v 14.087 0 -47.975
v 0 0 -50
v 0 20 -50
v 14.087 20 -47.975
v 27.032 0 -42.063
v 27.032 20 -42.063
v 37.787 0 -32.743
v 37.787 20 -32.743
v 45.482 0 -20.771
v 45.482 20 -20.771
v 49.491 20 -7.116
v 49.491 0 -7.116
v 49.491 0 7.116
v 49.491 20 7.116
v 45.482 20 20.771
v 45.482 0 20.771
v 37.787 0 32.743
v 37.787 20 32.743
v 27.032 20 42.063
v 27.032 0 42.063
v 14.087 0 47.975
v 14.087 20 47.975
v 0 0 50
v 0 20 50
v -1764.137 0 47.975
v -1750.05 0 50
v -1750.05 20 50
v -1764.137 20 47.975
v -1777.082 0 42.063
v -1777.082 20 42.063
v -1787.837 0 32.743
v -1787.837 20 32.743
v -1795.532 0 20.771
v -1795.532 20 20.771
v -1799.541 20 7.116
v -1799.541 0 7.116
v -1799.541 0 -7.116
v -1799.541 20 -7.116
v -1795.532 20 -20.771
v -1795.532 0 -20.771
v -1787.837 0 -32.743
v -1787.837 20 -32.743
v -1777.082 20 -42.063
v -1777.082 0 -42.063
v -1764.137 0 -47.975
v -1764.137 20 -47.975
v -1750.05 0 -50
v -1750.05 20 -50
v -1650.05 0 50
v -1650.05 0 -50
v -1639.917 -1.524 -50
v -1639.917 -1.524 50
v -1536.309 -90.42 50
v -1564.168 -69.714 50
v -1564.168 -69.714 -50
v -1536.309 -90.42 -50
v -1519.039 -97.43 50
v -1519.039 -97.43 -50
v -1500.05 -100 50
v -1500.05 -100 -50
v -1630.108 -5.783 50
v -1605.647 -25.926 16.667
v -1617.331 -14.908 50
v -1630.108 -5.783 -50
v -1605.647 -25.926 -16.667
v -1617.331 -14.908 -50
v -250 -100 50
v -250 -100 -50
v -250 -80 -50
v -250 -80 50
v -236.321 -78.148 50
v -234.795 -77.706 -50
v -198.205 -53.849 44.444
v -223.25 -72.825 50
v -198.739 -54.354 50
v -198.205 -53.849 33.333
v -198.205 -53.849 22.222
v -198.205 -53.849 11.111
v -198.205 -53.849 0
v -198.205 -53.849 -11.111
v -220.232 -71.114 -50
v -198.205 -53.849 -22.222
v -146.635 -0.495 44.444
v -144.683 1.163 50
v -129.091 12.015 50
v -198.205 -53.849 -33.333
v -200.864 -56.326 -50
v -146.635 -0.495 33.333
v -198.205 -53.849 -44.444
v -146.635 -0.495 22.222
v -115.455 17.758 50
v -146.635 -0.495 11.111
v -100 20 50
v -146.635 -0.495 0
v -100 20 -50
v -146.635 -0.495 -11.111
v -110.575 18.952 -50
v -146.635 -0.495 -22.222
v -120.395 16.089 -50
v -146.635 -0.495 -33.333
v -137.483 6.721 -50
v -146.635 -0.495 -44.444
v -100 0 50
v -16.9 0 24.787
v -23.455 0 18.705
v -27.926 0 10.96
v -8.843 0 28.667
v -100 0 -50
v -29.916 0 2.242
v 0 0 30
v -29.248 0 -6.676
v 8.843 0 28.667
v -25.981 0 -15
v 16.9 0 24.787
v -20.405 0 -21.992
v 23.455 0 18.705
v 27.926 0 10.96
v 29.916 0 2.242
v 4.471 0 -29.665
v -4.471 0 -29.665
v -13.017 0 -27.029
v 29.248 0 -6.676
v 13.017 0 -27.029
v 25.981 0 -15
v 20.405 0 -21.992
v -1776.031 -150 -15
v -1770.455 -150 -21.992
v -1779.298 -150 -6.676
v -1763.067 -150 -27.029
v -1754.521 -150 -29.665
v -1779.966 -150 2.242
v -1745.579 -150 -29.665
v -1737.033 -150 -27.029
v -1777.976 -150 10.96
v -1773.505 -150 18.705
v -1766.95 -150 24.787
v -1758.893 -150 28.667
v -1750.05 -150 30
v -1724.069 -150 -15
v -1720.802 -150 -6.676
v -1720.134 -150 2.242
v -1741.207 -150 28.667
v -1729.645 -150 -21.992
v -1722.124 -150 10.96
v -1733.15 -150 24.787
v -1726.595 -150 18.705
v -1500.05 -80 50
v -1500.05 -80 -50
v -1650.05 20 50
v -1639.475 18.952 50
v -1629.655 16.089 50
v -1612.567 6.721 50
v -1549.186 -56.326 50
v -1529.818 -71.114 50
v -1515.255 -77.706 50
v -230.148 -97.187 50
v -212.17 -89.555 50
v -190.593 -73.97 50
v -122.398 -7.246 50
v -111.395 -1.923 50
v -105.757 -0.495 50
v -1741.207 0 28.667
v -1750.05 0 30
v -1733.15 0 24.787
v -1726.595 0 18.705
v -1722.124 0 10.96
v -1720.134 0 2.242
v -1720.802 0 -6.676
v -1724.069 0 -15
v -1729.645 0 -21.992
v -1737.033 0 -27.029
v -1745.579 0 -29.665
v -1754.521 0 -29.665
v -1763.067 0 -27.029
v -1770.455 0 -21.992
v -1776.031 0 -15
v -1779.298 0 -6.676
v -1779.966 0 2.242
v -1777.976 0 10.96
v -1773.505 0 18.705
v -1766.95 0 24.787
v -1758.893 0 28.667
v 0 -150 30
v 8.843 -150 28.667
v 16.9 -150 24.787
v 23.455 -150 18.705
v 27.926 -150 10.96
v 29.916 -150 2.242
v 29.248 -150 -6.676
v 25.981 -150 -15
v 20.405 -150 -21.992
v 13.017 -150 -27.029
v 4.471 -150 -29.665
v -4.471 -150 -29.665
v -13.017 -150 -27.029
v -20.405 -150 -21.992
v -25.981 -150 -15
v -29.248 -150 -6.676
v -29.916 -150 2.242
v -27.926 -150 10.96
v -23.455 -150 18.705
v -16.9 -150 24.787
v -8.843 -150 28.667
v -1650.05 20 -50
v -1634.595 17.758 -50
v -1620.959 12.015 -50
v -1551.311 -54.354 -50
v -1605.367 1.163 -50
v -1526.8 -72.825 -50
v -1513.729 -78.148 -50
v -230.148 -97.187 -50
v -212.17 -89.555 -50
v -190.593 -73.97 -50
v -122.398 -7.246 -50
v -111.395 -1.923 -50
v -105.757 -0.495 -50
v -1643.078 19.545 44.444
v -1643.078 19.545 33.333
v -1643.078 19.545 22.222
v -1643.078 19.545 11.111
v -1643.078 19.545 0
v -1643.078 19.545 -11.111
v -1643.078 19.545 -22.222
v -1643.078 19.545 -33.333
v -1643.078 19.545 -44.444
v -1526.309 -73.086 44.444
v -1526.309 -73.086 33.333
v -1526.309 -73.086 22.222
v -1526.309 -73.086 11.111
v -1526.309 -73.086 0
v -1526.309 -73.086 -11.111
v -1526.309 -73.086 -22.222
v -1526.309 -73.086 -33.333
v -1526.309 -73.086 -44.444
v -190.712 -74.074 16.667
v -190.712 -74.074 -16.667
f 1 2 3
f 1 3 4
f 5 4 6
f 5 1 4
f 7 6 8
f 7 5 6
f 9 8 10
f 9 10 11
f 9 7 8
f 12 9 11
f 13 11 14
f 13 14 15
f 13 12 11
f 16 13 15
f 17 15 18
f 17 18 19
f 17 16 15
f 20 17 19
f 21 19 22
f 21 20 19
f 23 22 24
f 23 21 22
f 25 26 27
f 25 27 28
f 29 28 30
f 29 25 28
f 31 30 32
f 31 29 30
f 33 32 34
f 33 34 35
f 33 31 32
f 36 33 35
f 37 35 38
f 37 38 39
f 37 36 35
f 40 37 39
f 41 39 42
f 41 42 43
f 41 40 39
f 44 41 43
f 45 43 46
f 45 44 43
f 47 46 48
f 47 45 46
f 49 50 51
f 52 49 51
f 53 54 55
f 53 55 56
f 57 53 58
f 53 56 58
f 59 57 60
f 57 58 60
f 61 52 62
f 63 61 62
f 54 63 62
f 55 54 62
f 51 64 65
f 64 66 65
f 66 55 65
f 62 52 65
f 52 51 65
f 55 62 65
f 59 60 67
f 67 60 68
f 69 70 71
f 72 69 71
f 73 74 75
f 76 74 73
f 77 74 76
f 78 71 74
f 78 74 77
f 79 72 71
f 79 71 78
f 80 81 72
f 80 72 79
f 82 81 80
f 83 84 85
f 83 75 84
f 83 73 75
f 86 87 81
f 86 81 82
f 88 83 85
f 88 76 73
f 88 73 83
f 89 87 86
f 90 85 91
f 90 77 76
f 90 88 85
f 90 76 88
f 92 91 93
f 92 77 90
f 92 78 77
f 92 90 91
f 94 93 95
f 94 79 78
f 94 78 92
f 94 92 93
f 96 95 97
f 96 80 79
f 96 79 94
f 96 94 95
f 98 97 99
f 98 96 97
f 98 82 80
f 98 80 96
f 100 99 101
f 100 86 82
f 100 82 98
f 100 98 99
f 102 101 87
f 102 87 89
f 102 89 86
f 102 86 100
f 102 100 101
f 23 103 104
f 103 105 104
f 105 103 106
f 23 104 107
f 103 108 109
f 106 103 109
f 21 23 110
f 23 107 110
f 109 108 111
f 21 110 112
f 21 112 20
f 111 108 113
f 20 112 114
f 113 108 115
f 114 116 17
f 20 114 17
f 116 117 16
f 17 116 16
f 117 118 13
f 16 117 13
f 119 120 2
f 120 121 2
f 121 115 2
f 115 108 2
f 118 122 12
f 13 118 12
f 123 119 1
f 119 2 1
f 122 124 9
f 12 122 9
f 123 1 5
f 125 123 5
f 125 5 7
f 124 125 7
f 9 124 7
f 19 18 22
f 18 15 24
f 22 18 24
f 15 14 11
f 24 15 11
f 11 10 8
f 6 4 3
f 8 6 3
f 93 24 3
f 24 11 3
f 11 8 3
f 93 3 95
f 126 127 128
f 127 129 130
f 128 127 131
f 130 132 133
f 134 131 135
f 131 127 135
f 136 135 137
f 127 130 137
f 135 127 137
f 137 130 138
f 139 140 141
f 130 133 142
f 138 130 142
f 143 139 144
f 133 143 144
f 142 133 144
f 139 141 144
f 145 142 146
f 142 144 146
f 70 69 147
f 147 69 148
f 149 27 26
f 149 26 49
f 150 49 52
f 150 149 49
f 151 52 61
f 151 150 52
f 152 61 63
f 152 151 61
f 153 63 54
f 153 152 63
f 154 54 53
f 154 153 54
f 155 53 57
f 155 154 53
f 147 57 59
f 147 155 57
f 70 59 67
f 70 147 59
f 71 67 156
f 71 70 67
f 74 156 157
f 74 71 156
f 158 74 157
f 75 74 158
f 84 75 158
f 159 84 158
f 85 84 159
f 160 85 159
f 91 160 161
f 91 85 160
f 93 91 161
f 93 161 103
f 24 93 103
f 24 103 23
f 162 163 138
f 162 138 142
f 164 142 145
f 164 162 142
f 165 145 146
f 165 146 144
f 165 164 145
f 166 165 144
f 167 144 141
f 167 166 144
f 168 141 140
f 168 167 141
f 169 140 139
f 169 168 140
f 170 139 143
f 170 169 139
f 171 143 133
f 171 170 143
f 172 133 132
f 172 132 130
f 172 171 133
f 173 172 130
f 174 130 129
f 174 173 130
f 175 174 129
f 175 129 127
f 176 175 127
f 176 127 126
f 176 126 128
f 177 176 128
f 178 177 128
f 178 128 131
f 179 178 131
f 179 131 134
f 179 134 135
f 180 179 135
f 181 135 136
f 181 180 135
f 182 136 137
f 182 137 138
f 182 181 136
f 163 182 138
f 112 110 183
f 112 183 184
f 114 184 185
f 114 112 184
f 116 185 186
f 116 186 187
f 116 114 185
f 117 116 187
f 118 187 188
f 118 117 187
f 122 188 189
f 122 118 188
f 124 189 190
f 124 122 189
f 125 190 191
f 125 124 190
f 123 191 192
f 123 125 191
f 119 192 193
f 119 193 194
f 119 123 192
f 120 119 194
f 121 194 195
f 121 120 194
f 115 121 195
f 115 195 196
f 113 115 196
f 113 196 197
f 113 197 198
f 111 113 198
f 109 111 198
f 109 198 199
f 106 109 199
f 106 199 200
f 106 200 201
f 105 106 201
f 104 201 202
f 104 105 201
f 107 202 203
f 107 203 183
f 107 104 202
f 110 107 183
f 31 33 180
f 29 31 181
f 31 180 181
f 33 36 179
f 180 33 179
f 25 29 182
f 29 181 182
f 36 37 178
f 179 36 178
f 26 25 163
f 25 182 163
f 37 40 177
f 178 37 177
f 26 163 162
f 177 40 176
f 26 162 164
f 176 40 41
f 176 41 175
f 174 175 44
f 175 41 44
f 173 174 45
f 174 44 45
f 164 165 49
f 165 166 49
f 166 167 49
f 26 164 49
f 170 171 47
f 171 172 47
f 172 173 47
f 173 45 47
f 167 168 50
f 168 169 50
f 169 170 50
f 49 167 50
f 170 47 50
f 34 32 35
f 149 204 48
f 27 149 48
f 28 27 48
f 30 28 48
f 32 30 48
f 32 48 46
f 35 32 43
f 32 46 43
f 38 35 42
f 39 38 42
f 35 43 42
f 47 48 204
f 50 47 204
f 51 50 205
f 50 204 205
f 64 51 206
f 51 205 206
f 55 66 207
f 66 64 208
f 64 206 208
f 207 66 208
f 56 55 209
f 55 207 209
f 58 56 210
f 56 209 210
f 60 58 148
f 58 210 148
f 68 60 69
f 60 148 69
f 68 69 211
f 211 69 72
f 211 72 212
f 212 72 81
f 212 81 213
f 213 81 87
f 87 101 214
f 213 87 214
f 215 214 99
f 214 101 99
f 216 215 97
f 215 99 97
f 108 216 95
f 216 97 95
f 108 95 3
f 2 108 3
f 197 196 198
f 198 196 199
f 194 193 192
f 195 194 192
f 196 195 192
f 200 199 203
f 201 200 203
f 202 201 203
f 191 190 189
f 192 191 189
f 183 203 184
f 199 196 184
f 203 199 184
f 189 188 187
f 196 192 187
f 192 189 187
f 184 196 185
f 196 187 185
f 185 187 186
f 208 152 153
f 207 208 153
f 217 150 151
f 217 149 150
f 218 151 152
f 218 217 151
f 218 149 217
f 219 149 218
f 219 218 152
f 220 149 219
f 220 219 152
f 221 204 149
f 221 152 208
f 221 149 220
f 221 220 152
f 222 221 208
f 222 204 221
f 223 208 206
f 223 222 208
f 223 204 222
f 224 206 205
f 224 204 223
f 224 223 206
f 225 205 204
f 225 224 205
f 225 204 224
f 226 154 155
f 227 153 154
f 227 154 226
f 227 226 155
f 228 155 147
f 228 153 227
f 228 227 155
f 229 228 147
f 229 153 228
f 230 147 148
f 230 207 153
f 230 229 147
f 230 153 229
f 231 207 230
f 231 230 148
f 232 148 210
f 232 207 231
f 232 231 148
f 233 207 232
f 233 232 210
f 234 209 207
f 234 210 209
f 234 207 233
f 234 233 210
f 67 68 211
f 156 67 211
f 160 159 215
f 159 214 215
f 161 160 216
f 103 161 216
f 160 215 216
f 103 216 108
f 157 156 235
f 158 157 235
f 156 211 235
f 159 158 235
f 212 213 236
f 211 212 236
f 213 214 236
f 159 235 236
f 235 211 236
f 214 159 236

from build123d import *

# Parameters (mm, degrees)
SKETCH1_R             = 30
BOSS_EXTRUDE1_DEPTH   = 150
BOSS_EXTRUDE1_2_DEPTH = 150
EXTRUDE_THIN1_START   = -100
EXTRUDE_THIN1_DEPTH   = 100
SKETCH2_OUTSIDE_W     = 2224.156
SKETCH2_OUTSIDE_H     = 474.106
CUT_EXTRUDE1_DEPTH    = 100


# Read off the part's stored shape, not the designer's step: Extrude-Thin1
with BuildPart() as part:
    # Sketch1 → Boss-Extrude1 (new body)
    with BuildSketch(Plane(origin=(0, 0, 0), x_dir=(1, 0, 0), z_dir=(0, 1, 0))):
        with Locations(Location((0, 0, 0), (0, 0, 270))):
            Circle(SKETCH1_R)
    extrude(amount=-BOSS_EXTRUDE1_DEPTH)



with BuildPart() as body_2:
    # Sketch1 → Boss-Extrude1 2 (new body)
    with BuildSketch(Plane(origin=(0, 0, 0), x_dir=(1, 0, 0), z_dir=(0, 1, 0))):
        with Locations(Location((-1750.05, 0, 0), (0, 0, 270))):
            Circle(SKETCH1_R)
    extrude(amount=-BOSS_EXTRUDE1_2_DEPTH)


with BuildPart() as part_1:
    add(part.part)

    add(body_2.part)  # Extrude-Thin1 merges body 2
    # Extrude-Thin1 outline → Extrude-Thin1 (add)
    with BuildSketch(Plane.XY.offset(50).offset(EXTRUDE_THIN1_START)):
        with BuildLine():
            Line((-1500.05, -100), (-250, -100))
            add(Edge.make_bspline(
                [(-250, -100), (-180.532615563, -100), (-147.140452079, 0), (-100, 0)],
                knots=[0, 0, 0, 0, 1, 1, 1, 1], degree=3))
            Line((-100, 0), (50, 0))
            Line((50, 0), (50, 20))
            Line((50, 20), (-100, 20))
            add(Edge.make_bspline(
                [(-250, -80), (-246.8578922, -80), (-243.858737849, -79.72033393), (-237.993194947, -78.665321149), (-235.125426927, -77.888401959), (-229.419387385, -75.849767547), (-226.581615187, -74.586589055), (-220.900676803, -71.586264248), (-218.058608228, -69.848756808), (-212.373173985, -65.939898134), (-209.530533574, -63.76882272), (-203.856954109, -59.061240354), (-201.026304365, -56.525095932), (-195.383615818, -51.172709385), (-192.571647436, -48.356724406), (-186.962589328, -42.537122759), (-184.165515953, -39.533655599), (-178.571130319, -33.432647215), (-175.773867523, -30.335180457), (-170.151907521, -24.137576717), (-167.327345009, -21.037442901), (-161.608940626, -14.922554595), (-158.715354463, -11.907662629), (-152.79666366, -6.049585507), (-149.771886809, -3.205896979), (-143.499030151, 2.216662309), (-140.250865349, 4.796857765), (-133.403484489, 9.567046655), (-129.801981816, 11.759226892), (-124.033745357, 14.595891945), (-122.050123128, 15.465210164), (-117.953666514, 17.012030347), (-115.8406028, 17.689372637), (-111.491874555, 18.806547682), (-109.256121065, 19.246044187), (-104.688584729, 19.842959809), (-102.357022604, 20), (-100, 20)],
                knots=[0, 0, 0, 0, 0.0625, 0.0625, 0.125, 0.125, 0.1875, 0.1875, 0.25, 0.25, 0.3125, 0.3125, 0.375, 0.375, 0.4375, 0.4375, 0.5, 0.5, 0.5625, 0.5625, 0.625, 0.625, 0.6875, 0.6875, 0.75, 0.75, 0.8125, 0.8125, 0.875, 0.875, 0.90625, 0.90625, 0.9375, 0.9375, 0.96875, 0.96875, 1, 1, 1, 1], degree=3))
            Line((-250, -80), (-1500.05, -80))
            add(Edge.make_bspline(
                [(-1650.05, 20), (-1647.692977396, 20), (-1645.361415271, 19.842959809), (-1640.793878935, 19.246044187), (-1638.558125445, 18.806547682), (-1634.2093972, 17.689372637), (-1632.096333486, 17.012030347), (-1627.999876872, 15.465210164), (-1626.016254643, 14.595891945), (-1620.248018184, 11.759226892), (-1616.646515511, 9.567046655), (-1609.799134651, 4.796857765), (-1606.550969849, 2.216662309), (-1600.278113191, -3.205896979), (-1597.25333634, -6.049585507), (-1591.334645537, -11.907662629), (-1588.441059374, -14.922554595), (-1582.722654991, -21.037442901), (-1579.898092479, -24.137576717), (-1574.276132477, -30.335180457), (-1571.478869681, -33.432647215), (-1565.884484047, -39.533655599), (-1563.087410672, -42.537122759), (-1557.478352564, -48.356724406), (-1554.666384182, -51.172709385), (-1549.023695635, -56.525095932), (-1546.193045891, -59.061240354), (-1540.519466426, -63.76882272), (-1537.676826015, -65.939898134), (-1531.991391772, -69.848756808), (-1529.149323197, -71.586264248), (-1523.468384813, -74.586589055), (-1520.630612615, -75.849767547), (-1514.924573073, -77.888401959), (-1512.056805053, -78.665321149), (-1506.191262151, -79.72033393), (-1503.1921078, -80), (-1500.05, -80)],
                knots=[0, 0, 0, 0, 0.03125, 0.03125, 0.0625, 0.0625, 0.09375, 0.09375, 0.125, 0.125, 0.1875, 0.1875, 0.25, 0.25, 0.3125, 0.3125, 0.375, 0.375, 0.4375, 0.4375, 0.5, 0.5, 0.5625, 0.5625, 0.625, 0.625, 0.6875, 0.6875, 0.75, 0.75, 0.8125, 0.8125, 0.875, 0.875, 0.9375, 0.9375, 1, 1, 1, 1], degree=3))
            Line((-1650.05, 20), (-1800.05, 20))
            Line((-1800.05, 20), (-1800.05, 0))
            Line((-1800.05, 0), (-1650.05, 0))
            add(Edge.make_bspline(
                [(-1650.05, 0), (-1602.909547921, 0), (-1569.517384437, -100), (-1500.05, -100)],
                knots=[0, 0, 0, 0, 1, 1, 1, 1], degree=3))
        make_face()
    extrude(amount=EXTRUDE_THIN1_DEPTH)

    # Sketch2 outside → Cut-Extrude1 (cut)
    with BuildSketch(Plane(origin=(0, 0, 0), x_dir=(1, 0, 0), z_dir=(0, 1, 0))):
        with Locations((-875.025, 0)):
            Rectangle(SKETCH2_OUTSIDE_W, SKETCH2_OUTSIDE_H)
        with BuildLine():
            Line((0, -50), (-1750.05, -50))
            ThreePointArc((-1750.05, -50), (-1800.05, 0), (-1750.05, 50))
            Line((-1750.05, 50), (0, 50))
            ThreePointArc((0, 50), (50, 0), (0, -50))
        make_face(mode=Mode.SUBTRACT)
    extrude(amount=CUT_EXTRUDE1_DEPTH, mode=Mode.SUBTRACT)


solid = part_1.part
